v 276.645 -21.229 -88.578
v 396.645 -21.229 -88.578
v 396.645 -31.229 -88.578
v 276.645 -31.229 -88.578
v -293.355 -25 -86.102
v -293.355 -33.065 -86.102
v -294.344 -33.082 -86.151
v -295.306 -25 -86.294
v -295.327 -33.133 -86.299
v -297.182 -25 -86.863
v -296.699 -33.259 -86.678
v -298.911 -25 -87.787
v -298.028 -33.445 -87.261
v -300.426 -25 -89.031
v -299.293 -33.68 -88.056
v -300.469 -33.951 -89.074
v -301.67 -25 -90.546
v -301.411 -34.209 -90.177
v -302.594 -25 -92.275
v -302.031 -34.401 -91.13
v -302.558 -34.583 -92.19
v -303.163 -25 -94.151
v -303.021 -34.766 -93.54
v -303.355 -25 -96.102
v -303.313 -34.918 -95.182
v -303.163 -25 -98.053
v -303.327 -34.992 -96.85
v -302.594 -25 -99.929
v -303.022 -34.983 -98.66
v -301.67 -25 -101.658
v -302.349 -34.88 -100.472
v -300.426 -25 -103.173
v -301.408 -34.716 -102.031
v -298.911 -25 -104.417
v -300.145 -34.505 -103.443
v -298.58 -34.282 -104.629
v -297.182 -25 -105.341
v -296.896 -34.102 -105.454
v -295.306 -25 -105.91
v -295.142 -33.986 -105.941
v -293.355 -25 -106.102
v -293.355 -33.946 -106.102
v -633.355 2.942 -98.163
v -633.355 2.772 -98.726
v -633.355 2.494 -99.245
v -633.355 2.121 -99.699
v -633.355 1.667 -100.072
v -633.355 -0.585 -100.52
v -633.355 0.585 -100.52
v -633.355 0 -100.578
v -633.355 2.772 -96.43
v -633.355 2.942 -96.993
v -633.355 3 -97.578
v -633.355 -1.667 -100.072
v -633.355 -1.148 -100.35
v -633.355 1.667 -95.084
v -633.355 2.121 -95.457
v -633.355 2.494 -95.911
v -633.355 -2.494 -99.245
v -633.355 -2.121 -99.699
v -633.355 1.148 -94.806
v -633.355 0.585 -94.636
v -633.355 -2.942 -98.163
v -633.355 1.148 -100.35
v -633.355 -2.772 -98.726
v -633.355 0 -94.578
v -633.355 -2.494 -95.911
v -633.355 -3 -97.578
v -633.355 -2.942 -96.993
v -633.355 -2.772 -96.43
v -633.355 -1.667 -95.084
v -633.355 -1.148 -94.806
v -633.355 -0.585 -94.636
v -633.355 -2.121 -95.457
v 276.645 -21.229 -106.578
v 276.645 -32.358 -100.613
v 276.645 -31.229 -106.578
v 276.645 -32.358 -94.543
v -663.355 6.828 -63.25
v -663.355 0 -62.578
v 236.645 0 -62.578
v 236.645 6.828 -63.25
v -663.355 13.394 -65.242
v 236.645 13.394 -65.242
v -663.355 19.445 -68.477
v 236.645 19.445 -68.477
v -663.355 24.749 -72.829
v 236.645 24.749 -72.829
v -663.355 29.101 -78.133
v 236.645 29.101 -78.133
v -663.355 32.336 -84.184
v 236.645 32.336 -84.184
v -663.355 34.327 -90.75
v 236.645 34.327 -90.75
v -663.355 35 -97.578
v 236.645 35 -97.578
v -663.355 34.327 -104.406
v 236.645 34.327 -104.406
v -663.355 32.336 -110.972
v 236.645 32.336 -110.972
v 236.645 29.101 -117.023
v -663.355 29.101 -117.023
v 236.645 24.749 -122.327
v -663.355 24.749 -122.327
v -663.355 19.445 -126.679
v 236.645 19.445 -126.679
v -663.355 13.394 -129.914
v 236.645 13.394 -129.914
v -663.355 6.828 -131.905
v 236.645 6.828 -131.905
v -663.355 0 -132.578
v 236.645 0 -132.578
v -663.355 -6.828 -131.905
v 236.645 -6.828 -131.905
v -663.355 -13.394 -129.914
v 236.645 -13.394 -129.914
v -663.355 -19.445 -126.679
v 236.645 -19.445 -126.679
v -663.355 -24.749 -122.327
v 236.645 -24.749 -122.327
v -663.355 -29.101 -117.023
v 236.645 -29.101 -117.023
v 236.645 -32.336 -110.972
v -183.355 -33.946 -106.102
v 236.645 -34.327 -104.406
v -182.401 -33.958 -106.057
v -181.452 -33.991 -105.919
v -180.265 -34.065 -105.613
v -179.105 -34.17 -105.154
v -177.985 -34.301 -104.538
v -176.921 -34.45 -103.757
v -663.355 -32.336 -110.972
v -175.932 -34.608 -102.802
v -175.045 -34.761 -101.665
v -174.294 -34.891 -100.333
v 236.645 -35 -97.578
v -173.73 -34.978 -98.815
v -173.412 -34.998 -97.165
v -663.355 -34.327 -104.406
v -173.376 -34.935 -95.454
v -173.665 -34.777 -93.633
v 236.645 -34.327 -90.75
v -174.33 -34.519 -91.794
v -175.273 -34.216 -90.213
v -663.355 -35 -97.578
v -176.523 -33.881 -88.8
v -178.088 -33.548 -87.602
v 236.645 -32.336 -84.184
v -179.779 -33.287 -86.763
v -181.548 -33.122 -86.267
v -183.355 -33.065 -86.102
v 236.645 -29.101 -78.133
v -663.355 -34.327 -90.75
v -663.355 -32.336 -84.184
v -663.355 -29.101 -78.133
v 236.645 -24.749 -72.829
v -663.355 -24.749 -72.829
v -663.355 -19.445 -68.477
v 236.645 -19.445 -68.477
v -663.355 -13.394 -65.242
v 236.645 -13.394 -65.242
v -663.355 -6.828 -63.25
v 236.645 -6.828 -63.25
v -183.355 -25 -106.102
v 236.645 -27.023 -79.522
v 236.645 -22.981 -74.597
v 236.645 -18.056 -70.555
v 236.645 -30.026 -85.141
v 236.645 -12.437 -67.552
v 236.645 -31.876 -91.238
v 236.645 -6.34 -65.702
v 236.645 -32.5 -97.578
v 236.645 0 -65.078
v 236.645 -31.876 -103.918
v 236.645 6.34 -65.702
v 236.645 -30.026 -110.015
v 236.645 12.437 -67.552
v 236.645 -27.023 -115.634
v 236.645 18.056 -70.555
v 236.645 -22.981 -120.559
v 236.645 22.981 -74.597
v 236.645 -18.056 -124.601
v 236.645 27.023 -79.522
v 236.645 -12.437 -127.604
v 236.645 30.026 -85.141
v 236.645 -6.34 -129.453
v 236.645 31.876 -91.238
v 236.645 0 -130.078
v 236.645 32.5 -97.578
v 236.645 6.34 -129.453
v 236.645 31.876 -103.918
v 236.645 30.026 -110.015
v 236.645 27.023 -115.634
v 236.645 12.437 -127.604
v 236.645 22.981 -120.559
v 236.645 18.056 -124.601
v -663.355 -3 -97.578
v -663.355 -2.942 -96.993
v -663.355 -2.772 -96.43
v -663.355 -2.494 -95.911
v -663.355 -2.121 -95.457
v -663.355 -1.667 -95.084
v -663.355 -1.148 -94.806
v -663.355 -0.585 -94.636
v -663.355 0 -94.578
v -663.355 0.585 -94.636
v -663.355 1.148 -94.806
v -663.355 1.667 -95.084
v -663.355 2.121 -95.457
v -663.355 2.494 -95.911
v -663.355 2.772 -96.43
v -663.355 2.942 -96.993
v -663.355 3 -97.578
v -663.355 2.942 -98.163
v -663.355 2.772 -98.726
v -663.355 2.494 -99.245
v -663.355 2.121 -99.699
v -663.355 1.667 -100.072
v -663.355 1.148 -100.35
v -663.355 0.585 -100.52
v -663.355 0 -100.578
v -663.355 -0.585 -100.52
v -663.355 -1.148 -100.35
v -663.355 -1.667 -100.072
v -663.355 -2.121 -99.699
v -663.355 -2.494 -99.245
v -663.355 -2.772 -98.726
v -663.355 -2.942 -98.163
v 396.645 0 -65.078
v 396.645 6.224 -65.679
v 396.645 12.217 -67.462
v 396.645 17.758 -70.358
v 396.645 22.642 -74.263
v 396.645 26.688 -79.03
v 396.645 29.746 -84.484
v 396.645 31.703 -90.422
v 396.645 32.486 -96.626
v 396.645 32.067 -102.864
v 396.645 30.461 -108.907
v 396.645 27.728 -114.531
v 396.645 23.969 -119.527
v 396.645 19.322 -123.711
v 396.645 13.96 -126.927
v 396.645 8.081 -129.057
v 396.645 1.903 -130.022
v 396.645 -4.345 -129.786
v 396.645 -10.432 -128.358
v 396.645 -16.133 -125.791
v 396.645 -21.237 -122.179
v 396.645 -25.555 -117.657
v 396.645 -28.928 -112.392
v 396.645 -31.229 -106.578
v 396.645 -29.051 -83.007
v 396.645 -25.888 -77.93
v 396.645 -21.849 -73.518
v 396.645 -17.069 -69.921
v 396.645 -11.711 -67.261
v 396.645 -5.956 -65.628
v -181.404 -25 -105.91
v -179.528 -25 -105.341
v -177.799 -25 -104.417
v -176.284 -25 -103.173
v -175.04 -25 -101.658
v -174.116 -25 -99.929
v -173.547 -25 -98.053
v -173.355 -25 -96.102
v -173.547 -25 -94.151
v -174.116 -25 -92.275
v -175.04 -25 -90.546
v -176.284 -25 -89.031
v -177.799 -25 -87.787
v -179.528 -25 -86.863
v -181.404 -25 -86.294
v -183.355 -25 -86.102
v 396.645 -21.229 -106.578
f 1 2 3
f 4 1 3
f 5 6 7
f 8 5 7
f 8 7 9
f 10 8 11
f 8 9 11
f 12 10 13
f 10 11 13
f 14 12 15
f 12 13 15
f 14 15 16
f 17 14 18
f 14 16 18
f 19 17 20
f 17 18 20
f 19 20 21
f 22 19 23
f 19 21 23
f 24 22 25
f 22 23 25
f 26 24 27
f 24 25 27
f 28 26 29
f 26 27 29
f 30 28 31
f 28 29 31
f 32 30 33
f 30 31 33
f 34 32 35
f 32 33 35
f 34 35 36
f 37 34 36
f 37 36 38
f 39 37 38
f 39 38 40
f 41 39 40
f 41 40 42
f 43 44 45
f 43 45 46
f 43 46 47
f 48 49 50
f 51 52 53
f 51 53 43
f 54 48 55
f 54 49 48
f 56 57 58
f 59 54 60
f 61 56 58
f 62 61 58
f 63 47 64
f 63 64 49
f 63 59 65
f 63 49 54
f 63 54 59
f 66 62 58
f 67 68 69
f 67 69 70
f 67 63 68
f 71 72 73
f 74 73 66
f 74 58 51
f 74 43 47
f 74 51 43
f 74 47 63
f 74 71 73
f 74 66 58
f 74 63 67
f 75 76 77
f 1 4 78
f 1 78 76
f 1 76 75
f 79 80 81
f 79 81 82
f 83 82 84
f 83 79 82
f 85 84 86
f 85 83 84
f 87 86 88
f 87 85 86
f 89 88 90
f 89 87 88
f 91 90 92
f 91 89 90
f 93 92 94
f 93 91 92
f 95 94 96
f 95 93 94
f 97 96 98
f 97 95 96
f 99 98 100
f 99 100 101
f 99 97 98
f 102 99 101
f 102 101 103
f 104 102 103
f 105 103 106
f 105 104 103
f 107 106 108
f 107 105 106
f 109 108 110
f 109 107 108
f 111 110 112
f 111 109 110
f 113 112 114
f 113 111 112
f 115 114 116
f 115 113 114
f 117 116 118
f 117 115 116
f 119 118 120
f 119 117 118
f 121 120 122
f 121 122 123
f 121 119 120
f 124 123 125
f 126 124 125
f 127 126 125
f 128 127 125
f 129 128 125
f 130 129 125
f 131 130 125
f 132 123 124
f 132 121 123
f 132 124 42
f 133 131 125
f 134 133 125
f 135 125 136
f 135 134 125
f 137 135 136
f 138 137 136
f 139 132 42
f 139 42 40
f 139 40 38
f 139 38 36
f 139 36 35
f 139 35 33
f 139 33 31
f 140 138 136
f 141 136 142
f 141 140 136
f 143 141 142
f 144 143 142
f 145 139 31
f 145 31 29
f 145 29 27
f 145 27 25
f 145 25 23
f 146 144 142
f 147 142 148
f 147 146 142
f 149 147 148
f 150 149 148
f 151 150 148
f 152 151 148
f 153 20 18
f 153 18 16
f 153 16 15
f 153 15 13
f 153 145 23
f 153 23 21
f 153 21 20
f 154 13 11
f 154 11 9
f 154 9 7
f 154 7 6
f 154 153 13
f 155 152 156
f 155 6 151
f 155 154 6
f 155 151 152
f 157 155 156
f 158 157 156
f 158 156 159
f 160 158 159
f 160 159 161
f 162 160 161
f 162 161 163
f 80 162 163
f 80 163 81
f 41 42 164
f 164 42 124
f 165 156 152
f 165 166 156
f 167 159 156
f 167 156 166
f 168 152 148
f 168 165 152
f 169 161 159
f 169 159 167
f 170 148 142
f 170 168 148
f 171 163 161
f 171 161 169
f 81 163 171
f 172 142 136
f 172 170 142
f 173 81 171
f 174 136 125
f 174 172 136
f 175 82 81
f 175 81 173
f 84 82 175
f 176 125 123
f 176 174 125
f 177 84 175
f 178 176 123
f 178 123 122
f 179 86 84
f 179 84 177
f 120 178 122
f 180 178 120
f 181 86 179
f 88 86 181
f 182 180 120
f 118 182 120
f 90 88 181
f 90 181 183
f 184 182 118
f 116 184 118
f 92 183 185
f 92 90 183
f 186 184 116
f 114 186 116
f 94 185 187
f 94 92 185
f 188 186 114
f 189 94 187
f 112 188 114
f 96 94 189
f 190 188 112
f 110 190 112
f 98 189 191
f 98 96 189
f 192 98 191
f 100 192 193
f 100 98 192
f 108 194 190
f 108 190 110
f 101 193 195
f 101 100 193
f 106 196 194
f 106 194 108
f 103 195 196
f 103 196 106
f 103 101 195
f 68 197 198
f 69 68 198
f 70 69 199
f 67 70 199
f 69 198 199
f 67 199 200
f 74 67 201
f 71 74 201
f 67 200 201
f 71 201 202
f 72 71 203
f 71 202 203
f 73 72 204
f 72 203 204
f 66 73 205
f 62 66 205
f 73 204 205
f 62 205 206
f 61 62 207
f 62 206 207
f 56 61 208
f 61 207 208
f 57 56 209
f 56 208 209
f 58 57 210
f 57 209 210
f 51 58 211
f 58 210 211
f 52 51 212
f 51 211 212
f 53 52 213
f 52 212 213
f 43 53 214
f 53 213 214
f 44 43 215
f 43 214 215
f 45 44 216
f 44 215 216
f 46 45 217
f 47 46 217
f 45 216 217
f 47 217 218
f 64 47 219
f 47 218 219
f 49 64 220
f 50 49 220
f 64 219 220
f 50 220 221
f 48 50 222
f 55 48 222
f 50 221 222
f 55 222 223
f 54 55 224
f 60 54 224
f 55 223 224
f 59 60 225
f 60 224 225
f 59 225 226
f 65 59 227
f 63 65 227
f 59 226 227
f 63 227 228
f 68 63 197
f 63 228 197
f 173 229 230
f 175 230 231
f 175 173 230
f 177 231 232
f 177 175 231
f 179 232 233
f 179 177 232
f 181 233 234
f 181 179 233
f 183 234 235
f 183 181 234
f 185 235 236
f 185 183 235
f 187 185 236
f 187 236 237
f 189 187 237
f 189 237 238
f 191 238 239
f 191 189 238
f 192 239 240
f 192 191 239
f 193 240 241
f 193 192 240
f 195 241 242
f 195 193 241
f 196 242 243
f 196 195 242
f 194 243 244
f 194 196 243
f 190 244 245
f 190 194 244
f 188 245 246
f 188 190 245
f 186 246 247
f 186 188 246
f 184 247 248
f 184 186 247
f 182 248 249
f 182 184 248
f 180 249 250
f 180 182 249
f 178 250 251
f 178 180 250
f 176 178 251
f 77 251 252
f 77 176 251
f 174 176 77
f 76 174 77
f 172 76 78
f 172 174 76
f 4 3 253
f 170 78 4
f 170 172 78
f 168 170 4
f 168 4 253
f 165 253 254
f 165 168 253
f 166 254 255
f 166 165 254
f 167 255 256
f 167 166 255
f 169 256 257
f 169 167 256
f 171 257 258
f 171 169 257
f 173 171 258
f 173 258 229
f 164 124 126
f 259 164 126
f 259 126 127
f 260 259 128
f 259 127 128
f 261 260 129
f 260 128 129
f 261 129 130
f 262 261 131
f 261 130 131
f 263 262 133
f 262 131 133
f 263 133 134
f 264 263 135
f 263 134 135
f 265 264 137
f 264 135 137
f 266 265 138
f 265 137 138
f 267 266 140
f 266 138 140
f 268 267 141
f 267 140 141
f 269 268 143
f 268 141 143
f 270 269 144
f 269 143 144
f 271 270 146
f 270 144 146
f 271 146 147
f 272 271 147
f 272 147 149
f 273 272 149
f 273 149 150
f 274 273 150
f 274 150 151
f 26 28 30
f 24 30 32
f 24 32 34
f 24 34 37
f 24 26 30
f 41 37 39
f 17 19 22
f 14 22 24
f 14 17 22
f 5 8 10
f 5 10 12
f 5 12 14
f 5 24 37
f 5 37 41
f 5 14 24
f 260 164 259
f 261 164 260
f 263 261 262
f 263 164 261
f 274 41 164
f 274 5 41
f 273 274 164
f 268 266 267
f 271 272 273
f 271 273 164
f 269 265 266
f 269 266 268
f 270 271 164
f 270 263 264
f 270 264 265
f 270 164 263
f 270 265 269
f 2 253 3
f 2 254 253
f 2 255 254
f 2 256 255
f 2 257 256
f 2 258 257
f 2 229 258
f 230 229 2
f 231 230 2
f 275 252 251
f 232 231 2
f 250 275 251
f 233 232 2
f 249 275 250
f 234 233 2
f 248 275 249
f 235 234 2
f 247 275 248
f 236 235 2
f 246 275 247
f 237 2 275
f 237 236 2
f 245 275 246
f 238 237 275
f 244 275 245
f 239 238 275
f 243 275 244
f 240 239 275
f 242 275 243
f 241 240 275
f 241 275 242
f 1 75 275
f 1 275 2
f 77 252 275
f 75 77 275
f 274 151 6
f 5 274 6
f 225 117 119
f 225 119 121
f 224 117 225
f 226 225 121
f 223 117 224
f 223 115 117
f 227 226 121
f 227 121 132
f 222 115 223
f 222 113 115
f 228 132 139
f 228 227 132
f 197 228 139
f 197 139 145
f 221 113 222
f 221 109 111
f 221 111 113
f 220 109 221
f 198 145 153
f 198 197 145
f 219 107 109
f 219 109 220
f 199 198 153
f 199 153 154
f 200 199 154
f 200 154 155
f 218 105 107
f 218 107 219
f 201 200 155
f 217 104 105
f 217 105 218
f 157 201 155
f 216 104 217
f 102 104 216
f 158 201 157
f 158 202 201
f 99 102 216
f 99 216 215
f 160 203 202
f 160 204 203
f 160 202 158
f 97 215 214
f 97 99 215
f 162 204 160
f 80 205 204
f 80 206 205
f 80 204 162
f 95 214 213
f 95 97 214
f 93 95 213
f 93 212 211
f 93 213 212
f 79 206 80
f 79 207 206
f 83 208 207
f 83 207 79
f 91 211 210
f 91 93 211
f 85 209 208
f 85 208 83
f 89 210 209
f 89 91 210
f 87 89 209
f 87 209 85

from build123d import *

# Parameters (mm, degrees)
F3_DEPTH = 120
F6_DEPTH = 10
F7_R     = 3
F8_DEPTH = 30


with BuildPart() as f1:
    # F0 (on Front) → F1 (revolve)
    with BuildSketch(Plane.XZ):
        Polygon((236.6450538874, -62.5779533936), (-663.3549461126, -62.5779533936), (-663.3549461126, -97.5779533936), (396.6450538874, -97.5779533936), (396.6450538874, -65.0779533936), (236.6450538874, -65.0779533936), align=None)
    revolve(axis=Axis((-133.3549461126, 0, -97.5779533936), (-1, 0, 0)))

    # F2 (on face) → F3 (cut)
    with BuildSketch(Plane.YZ.offset(396.6450538874)):
        with BuildLine():
            Line((-21.2289929393, -88.5779533936), (-31.2289929393, -88.5779533936))
            ThreePointArc((-31.2289929393, -88.5779533936), (-32.5, -97.5779533936), (-31.2289929393, -106.5779533936))
            Line((-31.2289929393, -106.5779533936), (-21.2289929393, -106.5779533936))
            Line((-21.2289929393, -106.5779533936), (-21.2289929393, -88.5779533936))
        make_face()
    extrude(amount=-F3_DEPTH, mode=Mode.SUBTRACT)

    # F5 (on offset) → F6 (cut)
    with BuildSketch(Plane.XZ.offset(35)):
        with BuildLine():
            Line((-183.3549461126, -86.1021482944), (-293.3549461126, -86.1021482944))
            ThreePointArc((-293.3549461126, -86.1021482944), (-303.3549461126, -96.1021482944), (-293.3549461126, -106.1021482944))
            Line((-293.3549461126, -106.1021482944), (-183.3549461126, -106.1021482944))
            ThreePointArc((-183.3549461126, -106.1021482944), (-173.3549461126, -96.1021482944), (-183.3549461126, -86.1021482944))
        make_face()
    extrude(amount=-F6_DEPTH, mode=Mode.SUBTRACT)

    # F7 (on face) → F8 (cut)
    with BuildSketch(Plane(origin=(-663.3549461126, 0, 0), x_dir=(0, -1, 0), z_dir=(-1, 0, 0))):
        with Locations((0, -97.5779533936)):
            Circle(F7_R)
    extrude(amount=-F8_DEPTH, mode=Mode.SUBTRACT)


solid = f1.part
